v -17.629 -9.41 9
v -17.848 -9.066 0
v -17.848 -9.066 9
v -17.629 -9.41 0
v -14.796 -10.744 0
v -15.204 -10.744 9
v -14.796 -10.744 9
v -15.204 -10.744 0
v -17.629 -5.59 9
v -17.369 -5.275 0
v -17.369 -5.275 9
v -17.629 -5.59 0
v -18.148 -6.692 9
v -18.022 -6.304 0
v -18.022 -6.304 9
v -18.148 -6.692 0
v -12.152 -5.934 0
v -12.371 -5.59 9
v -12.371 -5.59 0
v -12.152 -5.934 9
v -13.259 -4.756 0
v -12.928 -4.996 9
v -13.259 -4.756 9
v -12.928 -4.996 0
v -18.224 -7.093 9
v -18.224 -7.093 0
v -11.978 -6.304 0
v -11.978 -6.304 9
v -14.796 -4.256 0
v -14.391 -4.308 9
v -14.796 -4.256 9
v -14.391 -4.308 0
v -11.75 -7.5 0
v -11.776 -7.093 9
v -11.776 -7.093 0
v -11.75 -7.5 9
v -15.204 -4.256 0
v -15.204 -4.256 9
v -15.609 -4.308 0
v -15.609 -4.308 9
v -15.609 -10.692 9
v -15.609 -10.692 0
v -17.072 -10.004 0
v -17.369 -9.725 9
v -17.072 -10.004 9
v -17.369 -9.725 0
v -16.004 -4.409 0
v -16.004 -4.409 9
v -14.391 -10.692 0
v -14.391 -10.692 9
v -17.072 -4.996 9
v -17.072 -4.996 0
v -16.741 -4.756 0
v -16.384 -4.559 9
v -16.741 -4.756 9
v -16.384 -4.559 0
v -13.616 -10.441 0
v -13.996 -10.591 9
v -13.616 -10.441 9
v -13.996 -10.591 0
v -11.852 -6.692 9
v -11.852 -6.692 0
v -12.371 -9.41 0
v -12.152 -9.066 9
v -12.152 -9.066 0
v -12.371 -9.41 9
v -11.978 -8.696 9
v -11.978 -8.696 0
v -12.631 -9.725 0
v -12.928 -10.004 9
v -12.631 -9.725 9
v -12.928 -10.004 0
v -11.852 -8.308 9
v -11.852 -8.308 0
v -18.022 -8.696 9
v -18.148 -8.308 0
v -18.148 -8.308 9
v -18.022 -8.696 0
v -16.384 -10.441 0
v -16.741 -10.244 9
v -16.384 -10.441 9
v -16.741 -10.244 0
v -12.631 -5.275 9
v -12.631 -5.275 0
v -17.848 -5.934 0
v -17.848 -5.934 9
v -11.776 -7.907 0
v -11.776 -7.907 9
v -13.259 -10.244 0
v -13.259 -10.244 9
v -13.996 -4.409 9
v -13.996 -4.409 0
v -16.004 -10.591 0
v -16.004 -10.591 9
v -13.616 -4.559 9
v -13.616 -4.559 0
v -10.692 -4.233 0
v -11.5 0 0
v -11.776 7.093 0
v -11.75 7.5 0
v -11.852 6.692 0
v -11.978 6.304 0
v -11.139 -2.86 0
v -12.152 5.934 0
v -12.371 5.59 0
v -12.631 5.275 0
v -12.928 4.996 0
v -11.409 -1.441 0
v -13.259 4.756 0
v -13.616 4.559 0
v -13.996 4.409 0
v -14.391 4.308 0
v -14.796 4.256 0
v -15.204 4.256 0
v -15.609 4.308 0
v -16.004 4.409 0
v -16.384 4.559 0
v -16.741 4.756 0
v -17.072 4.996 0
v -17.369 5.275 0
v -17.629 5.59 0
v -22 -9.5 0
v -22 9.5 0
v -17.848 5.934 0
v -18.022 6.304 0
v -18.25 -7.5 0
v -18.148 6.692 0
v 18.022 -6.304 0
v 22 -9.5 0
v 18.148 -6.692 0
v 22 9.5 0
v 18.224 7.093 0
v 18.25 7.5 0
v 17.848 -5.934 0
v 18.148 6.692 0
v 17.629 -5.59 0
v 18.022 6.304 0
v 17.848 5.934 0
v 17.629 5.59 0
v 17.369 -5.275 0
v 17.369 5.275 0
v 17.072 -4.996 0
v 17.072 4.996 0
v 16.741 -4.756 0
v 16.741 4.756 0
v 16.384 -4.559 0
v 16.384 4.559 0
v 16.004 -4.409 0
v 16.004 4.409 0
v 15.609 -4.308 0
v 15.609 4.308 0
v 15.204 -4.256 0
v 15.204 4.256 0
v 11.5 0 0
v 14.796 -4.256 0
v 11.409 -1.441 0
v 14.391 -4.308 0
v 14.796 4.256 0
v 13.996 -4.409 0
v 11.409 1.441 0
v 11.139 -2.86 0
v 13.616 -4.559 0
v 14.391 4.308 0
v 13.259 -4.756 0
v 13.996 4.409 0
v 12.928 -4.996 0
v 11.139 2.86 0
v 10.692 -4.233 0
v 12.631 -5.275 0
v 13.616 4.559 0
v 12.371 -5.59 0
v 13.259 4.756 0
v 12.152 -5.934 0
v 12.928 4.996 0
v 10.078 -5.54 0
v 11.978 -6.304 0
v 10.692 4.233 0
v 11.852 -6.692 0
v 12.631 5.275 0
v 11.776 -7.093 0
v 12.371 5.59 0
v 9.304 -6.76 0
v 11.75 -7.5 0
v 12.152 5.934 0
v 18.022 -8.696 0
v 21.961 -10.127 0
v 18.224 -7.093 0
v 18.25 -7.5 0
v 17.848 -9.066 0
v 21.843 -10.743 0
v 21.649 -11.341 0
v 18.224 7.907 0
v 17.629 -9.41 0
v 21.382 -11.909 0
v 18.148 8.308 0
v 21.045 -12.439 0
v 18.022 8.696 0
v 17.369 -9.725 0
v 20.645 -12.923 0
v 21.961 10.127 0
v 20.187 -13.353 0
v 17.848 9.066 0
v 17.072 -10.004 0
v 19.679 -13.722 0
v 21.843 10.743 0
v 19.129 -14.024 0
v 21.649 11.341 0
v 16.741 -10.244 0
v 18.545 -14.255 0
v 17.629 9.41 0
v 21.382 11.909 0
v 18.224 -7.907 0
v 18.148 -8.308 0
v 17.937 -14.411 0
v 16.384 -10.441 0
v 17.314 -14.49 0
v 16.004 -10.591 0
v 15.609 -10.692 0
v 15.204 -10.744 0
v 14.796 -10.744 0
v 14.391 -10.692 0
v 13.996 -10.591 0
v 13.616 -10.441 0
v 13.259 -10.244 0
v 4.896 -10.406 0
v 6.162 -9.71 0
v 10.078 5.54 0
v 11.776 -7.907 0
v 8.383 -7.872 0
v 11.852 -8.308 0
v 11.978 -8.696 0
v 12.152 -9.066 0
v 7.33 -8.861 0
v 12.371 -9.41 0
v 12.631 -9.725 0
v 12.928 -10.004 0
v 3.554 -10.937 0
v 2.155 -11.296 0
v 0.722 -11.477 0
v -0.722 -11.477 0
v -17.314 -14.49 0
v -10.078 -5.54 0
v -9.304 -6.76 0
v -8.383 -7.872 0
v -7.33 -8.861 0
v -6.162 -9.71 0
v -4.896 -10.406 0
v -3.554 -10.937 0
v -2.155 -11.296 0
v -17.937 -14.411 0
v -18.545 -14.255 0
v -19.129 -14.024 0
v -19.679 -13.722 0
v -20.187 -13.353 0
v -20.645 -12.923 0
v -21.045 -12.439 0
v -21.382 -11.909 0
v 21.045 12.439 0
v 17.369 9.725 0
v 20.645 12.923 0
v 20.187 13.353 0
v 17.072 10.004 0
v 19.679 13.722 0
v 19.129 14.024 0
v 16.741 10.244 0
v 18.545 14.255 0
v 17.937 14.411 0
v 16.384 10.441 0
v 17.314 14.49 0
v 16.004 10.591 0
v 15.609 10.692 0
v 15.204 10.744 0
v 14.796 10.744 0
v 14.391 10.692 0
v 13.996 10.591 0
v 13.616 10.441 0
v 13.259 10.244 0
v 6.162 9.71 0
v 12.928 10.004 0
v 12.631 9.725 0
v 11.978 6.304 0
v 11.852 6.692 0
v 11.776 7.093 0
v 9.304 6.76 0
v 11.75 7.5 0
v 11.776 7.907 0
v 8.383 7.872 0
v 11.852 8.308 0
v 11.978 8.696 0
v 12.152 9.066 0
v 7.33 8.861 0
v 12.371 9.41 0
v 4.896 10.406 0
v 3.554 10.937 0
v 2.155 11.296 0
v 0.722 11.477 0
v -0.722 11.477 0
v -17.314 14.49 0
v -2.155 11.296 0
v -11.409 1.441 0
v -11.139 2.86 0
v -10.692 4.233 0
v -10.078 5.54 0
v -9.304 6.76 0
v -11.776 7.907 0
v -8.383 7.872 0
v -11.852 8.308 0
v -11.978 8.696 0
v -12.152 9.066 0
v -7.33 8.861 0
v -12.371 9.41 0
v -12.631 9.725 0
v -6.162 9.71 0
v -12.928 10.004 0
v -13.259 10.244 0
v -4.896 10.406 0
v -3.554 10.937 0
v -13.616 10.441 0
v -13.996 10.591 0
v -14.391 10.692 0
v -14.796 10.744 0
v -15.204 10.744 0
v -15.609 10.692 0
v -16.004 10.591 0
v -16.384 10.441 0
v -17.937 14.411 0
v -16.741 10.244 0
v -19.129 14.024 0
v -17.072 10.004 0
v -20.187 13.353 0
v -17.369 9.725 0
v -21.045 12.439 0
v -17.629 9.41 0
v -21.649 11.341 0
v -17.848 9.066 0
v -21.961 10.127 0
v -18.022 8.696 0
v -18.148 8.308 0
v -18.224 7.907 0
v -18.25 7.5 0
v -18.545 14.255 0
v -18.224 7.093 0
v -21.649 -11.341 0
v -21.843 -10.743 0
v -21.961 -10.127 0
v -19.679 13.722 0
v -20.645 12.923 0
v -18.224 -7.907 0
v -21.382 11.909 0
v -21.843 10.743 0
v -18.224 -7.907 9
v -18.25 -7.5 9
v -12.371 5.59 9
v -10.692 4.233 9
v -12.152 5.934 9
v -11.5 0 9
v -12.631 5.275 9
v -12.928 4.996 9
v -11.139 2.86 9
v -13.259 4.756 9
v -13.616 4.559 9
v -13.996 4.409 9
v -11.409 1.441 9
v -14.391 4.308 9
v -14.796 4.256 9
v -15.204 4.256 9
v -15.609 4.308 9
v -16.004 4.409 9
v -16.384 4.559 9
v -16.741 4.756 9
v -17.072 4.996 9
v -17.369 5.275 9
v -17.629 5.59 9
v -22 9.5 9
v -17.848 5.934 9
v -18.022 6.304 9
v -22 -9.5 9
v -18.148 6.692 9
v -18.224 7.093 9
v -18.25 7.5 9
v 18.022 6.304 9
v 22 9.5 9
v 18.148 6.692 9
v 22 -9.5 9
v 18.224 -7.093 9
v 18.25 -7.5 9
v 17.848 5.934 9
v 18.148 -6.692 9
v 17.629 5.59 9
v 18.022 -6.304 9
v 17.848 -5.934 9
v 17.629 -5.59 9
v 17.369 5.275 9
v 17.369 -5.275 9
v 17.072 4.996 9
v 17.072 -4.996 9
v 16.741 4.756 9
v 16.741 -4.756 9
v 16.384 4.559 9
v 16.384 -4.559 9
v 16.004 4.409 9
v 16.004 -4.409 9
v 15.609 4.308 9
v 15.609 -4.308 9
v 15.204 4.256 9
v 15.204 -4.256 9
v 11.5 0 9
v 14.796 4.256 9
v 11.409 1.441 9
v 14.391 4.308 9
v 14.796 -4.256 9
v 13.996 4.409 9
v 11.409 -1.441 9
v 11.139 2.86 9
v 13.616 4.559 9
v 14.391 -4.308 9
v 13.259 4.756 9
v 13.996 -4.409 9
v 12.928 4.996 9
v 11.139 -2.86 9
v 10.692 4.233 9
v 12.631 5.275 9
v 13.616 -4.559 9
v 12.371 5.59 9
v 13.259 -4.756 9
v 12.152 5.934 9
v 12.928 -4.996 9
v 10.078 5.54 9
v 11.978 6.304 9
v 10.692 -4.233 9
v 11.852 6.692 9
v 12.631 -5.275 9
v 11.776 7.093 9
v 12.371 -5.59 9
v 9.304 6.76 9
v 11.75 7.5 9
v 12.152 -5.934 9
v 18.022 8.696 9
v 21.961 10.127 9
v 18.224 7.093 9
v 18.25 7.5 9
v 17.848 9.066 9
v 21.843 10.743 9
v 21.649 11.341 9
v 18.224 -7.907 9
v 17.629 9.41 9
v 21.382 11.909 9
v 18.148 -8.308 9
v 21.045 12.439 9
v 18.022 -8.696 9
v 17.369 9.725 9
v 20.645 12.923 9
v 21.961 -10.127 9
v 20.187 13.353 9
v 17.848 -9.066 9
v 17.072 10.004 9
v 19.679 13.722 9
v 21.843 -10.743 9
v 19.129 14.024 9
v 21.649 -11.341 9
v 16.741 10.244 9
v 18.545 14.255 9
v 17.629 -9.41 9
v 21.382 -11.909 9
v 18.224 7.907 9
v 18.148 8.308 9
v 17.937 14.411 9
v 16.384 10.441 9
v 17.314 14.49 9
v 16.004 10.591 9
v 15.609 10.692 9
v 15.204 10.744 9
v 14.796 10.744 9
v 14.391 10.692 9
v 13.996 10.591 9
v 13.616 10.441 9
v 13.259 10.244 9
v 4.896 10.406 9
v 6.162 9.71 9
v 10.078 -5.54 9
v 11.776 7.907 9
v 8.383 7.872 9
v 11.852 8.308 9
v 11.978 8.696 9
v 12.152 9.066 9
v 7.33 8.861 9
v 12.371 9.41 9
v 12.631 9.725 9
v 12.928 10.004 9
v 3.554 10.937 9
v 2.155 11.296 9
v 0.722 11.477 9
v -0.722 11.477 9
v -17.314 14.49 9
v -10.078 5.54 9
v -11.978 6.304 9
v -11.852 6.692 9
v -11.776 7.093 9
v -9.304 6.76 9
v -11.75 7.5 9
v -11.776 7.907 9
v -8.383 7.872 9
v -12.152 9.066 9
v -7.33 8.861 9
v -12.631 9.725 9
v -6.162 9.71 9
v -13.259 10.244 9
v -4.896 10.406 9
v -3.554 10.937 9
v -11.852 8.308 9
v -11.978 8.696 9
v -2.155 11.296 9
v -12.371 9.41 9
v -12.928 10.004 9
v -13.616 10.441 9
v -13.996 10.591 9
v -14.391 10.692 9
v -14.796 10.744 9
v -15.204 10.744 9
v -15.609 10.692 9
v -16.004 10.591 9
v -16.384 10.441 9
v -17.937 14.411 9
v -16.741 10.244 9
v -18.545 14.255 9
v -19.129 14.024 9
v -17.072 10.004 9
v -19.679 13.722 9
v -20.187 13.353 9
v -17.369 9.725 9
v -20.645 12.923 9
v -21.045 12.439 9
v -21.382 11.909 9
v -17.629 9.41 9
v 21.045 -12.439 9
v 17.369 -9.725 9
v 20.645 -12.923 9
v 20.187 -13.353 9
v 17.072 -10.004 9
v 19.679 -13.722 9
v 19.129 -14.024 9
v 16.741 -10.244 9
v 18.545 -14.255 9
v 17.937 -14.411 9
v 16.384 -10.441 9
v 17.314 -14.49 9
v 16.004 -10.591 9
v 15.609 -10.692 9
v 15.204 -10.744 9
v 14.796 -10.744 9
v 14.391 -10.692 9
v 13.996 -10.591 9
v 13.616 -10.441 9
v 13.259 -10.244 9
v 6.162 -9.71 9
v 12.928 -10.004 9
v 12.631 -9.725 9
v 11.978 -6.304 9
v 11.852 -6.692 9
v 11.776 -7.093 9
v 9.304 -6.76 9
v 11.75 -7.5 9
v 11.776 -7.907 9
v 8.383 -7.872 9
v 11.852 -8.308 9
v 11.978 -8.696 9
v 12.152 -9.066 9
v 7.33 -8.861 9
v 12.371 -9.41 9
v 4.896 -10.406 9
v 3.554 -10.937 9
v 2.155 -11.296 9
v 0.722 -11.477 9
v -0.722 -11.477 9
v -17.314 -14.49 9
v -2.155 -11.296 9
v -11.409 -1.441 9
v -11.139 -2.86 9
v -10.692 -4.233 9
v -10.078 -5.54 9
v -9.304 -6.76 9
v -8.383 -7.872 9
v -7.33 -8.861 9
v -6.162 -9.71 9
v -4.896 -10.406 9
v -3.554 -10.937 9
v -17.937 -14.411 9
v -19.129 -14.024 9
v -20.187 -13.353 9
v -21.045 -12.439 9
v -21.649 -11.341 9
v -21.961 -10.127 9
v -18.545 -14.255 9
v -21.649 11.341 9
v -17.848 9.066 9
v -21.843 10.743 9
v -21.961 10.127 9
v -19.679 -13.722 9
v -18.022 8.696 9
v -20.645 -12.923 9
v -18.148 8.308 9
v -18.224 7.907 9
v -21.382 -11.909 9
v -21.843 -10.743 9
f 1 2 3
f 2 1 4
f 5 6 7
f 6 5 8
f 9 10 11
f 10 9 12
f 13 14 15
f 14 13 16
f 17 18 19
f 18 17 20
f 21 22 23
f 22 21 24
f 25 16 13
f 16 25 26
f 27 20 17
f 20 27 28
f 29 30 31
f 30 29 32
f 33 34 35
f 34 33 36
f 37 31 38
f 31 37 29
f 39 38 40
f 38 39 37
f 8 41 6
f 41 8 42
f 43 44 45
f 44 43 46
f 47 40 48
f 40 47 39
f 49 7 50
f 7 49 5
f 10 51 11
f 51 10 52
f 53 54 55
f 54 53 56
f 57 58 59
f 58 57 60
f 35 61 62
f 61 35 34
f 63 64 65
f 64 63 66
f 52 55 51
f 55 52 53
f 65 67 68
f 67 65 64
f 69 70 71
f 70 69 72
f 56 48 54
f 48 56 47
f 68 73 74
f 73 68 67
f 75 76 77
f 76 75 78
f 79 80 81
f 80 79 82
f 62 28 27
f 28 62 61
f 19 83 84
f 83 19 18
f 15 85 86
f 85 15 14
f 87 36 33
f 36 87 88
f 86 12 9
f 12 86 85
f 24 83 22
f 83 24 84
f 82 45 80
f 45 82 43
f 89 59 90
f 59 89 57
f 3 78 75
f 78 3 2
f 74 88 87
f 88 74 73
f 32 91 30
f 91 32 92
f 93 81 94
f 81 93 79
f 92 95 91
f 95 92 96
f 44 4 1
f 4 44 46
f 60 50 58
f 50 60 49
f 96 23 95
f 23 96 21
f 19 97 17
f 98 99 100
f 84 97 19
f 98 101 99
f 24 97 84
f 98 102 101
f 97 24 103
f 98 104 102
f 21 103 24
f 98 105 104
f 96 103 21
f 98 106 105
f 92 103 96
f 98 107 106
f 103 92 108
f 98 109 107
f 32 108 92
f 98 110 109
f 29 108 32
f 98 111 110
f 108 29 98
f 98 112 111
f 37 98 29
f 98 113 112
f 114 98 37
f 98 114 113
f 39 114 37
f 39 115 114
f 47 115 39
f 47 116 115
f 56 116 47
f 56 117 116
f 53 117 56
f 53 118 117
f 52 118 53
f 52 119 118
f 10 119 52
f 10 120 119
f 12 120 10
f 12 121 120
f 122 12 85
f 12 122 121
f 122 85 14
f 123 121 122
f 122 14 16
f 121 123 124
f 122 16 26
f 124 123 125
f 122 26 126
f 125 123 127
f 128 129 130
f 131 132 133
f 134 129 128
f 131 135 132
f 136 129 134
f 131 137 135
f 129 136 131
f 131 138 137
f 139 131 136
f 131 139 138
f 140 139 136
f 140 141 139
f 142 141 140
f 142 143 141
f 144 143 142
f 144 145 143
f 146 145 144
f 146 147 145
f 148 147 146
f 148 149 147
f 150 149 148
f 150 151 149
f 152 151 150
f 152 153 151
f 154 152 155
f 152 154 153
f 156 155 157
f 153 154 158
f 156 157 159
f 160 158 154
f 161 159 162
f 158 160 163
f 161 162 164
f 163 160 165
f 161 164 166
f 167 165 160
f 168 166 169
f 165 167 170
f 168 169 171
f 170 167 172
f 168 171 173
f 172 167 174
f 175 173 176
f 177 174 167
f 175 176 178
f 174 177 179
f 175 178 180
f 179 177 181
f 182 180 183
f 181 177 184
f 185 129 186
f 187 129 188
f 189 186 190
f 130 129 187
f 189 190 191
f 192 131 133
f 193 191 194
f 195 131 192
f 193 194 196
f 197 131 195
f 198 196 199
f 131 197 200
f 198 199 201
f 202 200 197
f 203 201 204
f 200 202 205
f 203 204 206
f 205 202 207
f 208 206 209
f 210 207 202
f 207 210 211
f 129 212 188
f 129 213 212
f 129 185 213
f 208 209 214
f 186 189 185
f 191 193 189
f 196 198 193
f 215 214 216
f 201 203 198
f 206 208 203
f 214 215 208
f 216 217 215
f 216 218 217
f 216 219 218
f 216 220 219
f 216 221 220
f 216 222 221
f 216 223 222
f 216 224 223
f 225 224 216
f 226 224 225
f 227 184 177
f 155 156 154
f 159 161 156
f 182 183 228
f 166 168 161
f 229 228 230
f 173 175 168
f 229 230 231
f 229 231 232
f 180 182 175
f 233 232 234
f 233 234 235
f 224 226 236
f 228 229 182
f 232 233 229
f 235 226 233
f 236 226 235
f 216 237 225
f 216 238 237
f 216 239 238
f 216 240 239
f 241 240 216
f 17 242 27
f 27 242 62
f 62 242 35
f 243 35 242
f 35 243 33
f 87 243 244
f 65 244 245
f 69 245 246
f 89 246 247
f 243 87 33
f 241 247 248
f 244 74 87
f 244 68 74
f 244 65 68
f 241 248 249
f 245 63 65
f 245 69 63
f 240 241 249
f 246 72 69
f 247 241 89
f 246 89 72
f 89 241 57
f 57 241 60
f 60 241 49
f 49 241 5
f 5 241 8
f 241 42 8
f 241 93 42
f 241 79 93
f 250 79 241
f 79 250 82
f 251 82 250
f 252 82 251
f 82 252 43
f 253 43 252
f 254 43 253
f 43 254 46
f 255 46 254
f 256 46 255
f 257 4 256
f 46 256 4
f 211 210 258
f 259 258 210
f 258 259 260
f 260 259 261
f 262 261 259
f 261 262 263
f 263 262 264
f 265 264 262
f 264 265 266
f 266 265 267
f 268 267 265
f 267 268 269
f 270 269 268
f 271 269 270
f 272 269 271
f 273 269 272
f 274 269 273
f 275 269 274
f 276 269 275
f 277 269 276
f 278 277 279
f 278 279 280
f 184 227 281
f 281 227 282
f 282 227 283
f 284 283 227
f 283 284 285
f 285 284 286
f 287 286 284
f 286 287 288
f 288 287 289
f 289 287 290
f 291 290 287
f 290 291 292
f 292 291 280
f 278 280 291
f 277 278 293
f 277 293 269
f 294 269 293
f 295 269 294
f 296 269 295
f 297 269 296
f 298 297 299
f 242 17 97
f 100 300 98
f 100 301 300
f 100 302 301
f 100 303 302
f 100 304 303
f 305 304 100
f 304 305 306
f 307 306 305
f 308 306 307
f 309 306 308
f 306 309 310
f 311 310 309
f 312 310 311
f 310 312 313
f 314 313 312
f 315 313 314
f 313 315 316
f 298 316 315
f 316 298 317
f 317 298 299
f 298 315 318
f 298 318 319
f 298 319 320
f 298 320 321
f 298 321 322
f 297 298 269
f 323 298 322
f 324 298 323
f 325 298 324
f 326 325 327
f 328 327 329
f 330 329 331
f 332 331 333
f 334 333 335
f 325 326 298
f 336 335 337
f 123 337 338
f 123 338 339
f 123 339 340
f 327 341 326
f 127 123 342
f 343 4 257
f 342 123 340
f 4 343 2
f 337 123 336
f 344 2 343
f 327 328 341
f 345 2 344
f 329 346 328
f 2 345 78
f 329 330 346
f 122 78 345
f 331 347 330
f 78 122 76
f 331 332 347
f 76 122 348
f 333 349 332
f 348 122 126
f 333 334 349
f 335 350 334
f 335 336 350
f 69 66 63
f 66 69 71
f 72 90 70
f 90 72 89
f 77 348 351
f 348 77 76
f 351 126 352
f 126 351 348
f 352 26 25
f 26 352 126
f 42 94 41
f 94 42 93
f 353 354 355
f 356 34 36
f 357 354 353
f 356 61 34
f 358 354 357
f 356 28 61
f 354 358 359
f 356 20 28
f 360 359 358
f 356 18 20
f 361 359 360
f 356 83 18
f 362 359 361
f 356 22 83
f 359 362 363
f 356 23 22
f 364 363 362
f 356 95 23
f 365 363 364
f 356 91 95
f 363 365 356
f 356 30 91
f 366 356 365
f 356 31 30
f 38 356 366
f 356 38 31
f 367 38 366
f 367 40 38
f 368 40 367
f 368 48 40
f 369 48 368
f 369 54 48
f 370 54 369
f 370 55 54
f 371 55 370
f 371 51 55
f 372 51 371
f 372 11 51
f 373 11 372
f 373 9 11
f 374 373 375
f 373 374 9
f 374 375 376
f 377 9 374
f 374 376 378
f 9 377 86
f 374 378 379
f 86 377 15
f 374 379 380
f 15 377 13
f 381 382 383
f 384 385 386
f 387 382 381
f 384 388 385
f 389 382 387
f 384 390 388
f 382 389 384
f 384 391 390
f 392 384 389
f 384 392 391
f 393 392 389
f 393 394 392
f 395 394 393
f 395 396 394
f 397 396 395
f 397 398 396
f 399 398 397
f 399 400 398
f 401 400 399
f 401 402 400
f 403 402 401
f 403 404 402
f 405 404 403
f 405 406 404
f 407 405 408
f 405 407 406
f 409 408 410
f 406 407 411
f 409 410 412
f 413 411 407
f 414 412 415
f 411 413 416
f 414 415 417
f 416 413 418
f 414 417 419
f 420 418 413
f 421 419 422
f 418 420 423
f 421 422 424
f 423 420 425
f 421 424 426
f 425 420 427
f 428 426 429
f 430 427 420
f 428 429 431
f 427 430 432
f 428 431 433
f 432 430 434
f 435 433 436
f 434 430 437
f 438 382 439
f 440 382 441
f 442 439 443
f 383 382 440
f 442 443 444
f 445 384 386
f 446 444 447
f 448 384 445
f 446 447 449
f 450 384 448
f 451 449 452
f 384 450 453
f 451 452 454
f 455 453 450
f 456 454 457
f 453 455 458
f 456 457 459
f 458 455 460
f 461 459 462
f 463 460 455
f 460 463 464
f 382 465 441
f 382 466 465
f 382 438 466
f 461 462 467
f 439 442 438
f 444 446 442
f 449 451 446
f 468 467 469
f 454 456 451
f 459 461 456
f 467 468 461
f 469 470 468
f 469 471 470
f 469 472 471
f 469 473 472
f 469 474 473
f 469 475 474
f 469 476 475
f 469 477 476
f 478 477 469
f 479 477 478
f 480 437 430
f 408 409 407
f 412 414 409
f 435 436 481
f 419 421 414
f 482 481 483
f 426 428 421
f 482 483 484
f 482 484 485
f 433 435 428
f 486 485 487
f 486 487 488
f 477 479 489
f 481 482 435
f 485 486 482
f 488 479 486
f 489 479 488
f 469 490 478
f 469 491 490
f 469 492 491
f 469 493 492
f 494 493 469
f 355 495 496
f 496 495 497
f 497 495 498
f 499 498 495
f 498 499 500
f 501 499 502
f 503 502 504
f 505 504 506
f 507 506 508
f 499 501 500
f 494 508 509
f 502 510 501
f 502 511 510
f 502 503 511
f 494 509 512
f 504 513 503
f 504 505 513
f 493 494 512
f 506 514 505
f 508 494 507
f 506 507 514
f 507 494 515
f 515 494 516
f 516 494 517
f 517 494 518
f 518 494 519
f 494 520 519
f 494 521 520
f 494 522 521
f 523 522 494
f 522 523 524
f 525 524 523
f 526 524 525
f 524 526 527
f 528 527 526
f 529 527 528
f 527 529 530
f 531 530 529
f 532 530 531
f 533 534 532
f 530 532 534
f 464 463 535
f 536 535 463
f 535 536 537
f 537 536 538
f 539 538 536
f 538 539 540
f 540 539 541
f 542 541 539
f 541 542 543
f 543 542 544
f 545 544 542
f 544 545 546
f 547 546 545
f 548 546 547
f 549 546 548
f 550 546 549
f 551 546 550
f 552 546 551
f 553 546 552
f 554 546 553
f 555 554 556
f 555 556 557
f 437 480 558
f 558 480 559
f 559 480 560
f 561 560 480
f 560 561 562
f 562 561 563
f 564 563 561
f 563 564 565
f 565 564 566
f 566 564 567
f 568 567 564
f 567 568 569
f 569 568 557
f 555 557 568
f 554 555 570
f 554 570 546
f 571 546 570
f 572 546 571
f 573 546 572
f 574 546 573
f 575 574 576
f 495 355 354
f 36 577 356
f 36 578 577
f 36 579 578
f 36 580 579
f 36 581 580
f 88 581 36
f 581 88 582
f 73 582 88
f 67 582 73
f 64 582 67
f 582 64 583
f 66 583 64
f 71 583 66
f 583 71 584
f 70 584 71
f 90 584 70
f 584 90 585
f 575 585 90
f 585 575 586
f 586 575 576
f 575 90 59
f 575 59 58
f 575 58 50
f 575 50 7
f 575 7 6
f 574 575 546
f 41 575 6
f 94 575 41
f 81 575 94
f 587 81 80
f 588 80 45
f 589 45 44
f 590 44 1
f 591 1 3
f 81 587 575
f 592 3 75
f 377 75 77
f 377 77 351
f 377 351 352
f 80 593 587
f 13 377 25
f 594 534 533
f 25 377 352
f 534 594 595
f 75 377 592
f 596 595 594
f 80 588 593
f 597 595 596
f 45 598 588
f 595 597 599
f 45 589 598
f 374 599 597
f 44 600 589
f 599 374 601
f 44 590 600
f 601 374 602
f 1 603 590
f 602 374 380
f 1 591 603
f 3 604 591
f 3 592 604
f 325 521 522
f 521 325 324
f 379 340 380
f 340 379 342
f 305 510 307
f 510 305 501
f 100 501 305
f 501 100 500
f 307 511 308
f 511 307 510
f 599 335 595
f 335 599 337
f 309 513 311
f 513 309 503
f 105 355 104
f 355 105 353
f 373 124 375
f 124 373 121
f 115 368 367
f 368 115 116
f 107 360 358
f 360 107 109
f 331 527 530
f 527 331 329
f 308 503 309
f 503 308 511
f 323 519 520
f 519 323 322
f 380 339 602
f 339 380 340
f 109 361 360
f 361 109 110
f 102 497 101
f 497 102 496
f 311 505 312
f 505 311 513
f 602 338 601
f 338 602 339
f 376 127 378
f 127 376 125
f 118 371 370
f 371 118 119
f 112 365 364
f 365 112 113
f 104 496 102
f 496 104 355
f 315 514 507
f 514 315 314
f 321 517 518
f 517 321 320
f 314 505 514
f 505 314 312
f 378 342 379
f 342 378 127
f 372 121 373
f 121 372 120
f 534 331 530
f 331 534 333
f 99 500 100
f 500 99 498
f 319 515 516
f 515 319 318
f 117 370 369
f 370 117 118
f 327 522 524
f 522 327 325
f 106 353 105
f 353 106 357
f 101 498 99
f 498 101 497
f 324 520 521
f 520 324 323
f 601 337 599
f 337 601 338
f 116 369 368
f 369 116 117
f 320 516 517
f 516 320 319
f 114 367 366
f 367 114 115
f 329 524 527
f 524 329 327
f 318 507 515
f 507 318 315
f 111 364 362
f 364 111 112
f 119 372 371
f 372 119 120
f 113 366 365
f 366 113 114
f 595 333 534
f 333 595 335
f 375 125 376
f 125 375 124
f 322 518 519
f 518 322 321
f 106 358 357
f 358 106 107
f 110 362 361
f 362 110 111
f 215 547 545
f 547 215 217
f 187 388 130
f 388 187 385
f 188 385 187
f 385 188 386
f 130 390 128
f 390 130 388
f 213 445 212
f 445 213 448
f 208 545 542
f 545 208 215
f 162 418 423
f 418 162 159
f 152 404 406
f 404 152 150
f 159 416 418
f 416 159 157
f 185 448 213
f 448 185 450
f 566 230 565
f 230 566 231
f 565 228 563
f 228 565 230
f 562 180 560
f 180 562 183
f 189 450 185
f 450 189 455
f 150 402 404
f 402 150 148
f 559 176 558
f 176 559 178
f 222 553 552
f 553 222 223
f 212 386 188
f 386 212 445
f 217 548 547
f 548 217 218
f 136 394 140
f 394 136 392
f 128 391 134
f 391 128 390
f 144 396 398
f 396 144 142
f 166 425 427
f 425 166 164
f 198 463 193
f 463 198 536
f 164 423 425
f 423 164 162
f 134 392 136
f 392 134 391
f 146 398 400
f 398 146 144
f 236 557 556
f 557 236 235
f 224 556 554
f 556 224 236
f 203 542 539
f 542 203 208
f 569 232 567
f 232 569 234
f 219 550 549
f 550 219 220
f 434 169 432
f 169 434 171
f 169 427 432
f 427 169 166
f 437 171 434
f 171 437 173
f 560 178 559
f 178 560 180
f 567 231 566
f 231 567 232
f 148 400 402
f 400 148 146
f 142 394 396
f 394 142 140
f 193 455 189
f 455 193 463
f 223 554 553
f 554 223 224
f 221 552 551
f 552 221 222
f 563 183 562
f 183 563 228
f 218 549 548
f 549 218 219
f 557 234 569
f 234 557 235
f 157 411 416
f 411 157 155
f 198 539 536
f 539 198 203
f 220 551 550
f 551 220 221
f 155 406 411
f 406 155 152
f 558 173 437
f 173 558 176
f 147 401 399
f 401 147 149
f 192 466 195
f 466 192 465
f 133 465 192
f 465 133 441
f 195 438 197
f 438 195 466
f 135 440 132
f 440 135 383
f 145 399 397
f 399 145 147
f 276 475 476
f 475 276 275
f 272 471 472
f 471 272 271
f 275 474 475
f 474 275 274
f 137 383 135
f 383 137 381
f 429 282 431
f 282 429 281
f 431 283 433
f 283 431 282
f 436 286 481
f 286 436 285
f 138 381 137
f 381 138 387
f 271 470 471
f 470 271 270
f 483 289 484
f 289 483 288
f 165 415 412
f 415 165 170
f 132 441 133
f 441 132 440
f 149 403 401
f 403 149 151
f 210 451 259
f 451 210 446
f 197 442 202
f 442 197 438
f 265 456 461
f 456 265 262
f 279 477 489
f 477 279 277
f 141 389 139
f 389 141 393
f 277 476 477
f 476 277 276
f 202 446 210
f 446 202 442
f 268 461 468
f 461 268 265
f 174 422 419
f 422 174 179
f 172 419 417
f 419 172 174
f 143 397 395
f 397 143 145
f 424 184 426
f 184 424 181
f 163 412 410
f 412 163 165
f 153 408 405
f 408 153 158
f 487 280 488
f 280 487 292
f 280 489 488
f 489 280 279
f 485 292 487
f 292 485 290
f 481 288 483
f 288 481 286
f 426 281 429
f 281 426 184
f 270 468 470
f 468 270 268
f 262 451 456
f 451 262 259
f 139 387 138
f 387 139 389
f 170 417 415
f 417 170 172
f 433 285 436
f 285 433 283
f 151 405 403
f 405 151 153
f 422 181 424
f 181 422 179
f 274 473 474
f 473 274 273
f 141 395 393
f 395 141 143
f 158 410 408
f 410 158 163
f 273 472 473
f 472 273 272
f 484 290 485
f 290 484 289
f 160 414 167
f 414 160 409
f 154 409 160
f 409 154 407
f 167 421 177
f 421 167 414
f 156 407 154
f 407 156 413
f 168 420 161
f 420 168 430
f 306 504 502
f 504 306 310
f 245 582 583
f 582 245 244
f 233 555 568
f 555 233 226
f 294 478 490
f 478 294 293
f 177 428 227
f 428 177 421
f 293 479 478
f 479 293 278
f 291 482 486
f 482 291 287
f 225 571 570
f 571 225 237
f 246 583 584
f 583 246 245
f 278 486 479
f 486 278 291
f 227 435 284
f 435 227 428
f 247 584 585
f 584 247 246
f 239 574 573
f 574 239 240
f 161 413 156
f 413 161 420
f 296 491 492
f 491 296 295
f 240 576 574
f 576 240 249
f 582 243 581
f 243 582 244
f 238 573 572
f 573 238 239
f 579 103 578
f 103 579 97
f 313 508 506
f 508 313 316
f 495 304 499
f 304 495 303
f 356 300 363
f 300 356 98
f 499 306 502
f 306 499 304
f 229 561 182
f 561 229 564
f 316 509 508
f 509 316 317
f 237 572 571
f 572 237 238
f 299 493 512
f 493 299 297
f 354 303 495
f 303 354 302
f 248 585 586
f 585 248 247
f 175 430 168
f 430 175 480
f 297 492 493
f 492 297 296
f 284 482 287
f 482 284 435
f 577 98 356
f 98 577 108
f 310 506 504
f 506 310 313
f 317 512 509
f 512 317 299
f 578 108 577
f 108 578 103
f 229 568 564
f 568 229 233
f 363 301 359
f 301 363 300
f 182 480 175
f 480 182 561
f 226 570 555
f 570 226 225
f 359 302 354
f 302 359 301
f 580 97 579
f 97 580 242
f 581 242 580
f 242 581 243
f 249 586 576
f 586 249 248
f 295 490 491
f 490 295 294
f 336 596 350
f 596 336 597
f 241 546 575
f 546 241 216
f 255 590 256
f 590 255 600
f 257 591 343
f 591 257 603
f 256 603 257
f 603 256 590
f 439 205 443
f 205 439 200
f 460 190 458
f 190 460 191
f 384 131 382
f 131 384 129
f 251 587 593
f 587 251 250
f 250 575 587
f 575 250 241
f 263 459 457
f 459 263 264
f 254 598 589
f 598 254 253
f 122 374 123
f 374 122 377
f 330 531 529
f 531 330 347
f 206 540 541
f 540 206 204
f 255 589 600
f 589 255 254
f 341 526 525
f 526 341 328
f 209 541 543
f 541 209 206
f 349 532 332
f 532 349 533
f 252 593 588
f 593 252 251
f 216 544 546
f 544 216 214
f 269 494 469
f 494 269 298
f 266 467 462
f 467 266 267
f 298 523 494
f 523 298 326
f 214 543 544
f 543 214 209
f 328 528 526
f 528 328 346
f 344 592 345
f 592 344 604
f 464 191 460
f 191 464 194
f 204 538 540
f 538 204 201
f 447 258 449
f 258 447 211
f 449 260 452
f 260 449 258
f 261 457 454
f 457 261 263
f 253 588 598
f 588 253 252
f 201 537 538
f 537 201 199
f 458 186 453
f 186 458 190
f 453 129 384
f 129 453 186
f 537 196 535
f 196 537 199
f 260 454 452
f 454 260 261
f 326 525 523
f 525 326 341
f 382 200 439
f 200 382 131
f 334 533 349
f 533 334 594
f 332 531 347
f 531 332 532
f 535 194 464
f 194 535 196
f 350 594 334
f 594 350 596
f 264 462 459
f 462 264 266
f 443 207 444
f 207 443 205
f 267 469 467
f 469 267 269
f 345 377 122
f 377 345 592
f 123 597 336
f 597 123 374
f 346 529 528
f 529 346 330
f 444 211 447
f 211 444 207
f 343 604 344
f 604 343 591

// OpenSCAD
$fn = 50;

difference() {
	union() {
		hull() {
			translate(v = [-17.0, 9.5, 0]) {
				cylinder(h = 9, r = 5);
			}
			translate(v = [17.0, 9.5, 0]) {
				cylinder(h = 9, r = 5);
			}
			translate(v = [-17.0, -9.5, 0]) {
				cylinder(h = 9, r = 5);
			}
			translate(v = [17.0, -9.5, 0]) {
				cylinder(h = 9, r = 5);
			}
		}
	}
	union() {
		translate(v = [-15.0, -7.5, 0]) {
			cylinder(h = 9, r = 3.25);
		}
		translate(v = [-15.0, 7.5, 0]) {
			cylinder(h = 9, r = 3.25);
		}
		translate(v = [15.0, -7.5, 0]) {
			cylinder(h = 9, r = 3.25);
		}
		translate(v = [15.0, 7.5, 0]) {
			cylinder(h = 9, r = 3.25);
		}
		cylinder(h = 9, r = 11.5);
	}
}
